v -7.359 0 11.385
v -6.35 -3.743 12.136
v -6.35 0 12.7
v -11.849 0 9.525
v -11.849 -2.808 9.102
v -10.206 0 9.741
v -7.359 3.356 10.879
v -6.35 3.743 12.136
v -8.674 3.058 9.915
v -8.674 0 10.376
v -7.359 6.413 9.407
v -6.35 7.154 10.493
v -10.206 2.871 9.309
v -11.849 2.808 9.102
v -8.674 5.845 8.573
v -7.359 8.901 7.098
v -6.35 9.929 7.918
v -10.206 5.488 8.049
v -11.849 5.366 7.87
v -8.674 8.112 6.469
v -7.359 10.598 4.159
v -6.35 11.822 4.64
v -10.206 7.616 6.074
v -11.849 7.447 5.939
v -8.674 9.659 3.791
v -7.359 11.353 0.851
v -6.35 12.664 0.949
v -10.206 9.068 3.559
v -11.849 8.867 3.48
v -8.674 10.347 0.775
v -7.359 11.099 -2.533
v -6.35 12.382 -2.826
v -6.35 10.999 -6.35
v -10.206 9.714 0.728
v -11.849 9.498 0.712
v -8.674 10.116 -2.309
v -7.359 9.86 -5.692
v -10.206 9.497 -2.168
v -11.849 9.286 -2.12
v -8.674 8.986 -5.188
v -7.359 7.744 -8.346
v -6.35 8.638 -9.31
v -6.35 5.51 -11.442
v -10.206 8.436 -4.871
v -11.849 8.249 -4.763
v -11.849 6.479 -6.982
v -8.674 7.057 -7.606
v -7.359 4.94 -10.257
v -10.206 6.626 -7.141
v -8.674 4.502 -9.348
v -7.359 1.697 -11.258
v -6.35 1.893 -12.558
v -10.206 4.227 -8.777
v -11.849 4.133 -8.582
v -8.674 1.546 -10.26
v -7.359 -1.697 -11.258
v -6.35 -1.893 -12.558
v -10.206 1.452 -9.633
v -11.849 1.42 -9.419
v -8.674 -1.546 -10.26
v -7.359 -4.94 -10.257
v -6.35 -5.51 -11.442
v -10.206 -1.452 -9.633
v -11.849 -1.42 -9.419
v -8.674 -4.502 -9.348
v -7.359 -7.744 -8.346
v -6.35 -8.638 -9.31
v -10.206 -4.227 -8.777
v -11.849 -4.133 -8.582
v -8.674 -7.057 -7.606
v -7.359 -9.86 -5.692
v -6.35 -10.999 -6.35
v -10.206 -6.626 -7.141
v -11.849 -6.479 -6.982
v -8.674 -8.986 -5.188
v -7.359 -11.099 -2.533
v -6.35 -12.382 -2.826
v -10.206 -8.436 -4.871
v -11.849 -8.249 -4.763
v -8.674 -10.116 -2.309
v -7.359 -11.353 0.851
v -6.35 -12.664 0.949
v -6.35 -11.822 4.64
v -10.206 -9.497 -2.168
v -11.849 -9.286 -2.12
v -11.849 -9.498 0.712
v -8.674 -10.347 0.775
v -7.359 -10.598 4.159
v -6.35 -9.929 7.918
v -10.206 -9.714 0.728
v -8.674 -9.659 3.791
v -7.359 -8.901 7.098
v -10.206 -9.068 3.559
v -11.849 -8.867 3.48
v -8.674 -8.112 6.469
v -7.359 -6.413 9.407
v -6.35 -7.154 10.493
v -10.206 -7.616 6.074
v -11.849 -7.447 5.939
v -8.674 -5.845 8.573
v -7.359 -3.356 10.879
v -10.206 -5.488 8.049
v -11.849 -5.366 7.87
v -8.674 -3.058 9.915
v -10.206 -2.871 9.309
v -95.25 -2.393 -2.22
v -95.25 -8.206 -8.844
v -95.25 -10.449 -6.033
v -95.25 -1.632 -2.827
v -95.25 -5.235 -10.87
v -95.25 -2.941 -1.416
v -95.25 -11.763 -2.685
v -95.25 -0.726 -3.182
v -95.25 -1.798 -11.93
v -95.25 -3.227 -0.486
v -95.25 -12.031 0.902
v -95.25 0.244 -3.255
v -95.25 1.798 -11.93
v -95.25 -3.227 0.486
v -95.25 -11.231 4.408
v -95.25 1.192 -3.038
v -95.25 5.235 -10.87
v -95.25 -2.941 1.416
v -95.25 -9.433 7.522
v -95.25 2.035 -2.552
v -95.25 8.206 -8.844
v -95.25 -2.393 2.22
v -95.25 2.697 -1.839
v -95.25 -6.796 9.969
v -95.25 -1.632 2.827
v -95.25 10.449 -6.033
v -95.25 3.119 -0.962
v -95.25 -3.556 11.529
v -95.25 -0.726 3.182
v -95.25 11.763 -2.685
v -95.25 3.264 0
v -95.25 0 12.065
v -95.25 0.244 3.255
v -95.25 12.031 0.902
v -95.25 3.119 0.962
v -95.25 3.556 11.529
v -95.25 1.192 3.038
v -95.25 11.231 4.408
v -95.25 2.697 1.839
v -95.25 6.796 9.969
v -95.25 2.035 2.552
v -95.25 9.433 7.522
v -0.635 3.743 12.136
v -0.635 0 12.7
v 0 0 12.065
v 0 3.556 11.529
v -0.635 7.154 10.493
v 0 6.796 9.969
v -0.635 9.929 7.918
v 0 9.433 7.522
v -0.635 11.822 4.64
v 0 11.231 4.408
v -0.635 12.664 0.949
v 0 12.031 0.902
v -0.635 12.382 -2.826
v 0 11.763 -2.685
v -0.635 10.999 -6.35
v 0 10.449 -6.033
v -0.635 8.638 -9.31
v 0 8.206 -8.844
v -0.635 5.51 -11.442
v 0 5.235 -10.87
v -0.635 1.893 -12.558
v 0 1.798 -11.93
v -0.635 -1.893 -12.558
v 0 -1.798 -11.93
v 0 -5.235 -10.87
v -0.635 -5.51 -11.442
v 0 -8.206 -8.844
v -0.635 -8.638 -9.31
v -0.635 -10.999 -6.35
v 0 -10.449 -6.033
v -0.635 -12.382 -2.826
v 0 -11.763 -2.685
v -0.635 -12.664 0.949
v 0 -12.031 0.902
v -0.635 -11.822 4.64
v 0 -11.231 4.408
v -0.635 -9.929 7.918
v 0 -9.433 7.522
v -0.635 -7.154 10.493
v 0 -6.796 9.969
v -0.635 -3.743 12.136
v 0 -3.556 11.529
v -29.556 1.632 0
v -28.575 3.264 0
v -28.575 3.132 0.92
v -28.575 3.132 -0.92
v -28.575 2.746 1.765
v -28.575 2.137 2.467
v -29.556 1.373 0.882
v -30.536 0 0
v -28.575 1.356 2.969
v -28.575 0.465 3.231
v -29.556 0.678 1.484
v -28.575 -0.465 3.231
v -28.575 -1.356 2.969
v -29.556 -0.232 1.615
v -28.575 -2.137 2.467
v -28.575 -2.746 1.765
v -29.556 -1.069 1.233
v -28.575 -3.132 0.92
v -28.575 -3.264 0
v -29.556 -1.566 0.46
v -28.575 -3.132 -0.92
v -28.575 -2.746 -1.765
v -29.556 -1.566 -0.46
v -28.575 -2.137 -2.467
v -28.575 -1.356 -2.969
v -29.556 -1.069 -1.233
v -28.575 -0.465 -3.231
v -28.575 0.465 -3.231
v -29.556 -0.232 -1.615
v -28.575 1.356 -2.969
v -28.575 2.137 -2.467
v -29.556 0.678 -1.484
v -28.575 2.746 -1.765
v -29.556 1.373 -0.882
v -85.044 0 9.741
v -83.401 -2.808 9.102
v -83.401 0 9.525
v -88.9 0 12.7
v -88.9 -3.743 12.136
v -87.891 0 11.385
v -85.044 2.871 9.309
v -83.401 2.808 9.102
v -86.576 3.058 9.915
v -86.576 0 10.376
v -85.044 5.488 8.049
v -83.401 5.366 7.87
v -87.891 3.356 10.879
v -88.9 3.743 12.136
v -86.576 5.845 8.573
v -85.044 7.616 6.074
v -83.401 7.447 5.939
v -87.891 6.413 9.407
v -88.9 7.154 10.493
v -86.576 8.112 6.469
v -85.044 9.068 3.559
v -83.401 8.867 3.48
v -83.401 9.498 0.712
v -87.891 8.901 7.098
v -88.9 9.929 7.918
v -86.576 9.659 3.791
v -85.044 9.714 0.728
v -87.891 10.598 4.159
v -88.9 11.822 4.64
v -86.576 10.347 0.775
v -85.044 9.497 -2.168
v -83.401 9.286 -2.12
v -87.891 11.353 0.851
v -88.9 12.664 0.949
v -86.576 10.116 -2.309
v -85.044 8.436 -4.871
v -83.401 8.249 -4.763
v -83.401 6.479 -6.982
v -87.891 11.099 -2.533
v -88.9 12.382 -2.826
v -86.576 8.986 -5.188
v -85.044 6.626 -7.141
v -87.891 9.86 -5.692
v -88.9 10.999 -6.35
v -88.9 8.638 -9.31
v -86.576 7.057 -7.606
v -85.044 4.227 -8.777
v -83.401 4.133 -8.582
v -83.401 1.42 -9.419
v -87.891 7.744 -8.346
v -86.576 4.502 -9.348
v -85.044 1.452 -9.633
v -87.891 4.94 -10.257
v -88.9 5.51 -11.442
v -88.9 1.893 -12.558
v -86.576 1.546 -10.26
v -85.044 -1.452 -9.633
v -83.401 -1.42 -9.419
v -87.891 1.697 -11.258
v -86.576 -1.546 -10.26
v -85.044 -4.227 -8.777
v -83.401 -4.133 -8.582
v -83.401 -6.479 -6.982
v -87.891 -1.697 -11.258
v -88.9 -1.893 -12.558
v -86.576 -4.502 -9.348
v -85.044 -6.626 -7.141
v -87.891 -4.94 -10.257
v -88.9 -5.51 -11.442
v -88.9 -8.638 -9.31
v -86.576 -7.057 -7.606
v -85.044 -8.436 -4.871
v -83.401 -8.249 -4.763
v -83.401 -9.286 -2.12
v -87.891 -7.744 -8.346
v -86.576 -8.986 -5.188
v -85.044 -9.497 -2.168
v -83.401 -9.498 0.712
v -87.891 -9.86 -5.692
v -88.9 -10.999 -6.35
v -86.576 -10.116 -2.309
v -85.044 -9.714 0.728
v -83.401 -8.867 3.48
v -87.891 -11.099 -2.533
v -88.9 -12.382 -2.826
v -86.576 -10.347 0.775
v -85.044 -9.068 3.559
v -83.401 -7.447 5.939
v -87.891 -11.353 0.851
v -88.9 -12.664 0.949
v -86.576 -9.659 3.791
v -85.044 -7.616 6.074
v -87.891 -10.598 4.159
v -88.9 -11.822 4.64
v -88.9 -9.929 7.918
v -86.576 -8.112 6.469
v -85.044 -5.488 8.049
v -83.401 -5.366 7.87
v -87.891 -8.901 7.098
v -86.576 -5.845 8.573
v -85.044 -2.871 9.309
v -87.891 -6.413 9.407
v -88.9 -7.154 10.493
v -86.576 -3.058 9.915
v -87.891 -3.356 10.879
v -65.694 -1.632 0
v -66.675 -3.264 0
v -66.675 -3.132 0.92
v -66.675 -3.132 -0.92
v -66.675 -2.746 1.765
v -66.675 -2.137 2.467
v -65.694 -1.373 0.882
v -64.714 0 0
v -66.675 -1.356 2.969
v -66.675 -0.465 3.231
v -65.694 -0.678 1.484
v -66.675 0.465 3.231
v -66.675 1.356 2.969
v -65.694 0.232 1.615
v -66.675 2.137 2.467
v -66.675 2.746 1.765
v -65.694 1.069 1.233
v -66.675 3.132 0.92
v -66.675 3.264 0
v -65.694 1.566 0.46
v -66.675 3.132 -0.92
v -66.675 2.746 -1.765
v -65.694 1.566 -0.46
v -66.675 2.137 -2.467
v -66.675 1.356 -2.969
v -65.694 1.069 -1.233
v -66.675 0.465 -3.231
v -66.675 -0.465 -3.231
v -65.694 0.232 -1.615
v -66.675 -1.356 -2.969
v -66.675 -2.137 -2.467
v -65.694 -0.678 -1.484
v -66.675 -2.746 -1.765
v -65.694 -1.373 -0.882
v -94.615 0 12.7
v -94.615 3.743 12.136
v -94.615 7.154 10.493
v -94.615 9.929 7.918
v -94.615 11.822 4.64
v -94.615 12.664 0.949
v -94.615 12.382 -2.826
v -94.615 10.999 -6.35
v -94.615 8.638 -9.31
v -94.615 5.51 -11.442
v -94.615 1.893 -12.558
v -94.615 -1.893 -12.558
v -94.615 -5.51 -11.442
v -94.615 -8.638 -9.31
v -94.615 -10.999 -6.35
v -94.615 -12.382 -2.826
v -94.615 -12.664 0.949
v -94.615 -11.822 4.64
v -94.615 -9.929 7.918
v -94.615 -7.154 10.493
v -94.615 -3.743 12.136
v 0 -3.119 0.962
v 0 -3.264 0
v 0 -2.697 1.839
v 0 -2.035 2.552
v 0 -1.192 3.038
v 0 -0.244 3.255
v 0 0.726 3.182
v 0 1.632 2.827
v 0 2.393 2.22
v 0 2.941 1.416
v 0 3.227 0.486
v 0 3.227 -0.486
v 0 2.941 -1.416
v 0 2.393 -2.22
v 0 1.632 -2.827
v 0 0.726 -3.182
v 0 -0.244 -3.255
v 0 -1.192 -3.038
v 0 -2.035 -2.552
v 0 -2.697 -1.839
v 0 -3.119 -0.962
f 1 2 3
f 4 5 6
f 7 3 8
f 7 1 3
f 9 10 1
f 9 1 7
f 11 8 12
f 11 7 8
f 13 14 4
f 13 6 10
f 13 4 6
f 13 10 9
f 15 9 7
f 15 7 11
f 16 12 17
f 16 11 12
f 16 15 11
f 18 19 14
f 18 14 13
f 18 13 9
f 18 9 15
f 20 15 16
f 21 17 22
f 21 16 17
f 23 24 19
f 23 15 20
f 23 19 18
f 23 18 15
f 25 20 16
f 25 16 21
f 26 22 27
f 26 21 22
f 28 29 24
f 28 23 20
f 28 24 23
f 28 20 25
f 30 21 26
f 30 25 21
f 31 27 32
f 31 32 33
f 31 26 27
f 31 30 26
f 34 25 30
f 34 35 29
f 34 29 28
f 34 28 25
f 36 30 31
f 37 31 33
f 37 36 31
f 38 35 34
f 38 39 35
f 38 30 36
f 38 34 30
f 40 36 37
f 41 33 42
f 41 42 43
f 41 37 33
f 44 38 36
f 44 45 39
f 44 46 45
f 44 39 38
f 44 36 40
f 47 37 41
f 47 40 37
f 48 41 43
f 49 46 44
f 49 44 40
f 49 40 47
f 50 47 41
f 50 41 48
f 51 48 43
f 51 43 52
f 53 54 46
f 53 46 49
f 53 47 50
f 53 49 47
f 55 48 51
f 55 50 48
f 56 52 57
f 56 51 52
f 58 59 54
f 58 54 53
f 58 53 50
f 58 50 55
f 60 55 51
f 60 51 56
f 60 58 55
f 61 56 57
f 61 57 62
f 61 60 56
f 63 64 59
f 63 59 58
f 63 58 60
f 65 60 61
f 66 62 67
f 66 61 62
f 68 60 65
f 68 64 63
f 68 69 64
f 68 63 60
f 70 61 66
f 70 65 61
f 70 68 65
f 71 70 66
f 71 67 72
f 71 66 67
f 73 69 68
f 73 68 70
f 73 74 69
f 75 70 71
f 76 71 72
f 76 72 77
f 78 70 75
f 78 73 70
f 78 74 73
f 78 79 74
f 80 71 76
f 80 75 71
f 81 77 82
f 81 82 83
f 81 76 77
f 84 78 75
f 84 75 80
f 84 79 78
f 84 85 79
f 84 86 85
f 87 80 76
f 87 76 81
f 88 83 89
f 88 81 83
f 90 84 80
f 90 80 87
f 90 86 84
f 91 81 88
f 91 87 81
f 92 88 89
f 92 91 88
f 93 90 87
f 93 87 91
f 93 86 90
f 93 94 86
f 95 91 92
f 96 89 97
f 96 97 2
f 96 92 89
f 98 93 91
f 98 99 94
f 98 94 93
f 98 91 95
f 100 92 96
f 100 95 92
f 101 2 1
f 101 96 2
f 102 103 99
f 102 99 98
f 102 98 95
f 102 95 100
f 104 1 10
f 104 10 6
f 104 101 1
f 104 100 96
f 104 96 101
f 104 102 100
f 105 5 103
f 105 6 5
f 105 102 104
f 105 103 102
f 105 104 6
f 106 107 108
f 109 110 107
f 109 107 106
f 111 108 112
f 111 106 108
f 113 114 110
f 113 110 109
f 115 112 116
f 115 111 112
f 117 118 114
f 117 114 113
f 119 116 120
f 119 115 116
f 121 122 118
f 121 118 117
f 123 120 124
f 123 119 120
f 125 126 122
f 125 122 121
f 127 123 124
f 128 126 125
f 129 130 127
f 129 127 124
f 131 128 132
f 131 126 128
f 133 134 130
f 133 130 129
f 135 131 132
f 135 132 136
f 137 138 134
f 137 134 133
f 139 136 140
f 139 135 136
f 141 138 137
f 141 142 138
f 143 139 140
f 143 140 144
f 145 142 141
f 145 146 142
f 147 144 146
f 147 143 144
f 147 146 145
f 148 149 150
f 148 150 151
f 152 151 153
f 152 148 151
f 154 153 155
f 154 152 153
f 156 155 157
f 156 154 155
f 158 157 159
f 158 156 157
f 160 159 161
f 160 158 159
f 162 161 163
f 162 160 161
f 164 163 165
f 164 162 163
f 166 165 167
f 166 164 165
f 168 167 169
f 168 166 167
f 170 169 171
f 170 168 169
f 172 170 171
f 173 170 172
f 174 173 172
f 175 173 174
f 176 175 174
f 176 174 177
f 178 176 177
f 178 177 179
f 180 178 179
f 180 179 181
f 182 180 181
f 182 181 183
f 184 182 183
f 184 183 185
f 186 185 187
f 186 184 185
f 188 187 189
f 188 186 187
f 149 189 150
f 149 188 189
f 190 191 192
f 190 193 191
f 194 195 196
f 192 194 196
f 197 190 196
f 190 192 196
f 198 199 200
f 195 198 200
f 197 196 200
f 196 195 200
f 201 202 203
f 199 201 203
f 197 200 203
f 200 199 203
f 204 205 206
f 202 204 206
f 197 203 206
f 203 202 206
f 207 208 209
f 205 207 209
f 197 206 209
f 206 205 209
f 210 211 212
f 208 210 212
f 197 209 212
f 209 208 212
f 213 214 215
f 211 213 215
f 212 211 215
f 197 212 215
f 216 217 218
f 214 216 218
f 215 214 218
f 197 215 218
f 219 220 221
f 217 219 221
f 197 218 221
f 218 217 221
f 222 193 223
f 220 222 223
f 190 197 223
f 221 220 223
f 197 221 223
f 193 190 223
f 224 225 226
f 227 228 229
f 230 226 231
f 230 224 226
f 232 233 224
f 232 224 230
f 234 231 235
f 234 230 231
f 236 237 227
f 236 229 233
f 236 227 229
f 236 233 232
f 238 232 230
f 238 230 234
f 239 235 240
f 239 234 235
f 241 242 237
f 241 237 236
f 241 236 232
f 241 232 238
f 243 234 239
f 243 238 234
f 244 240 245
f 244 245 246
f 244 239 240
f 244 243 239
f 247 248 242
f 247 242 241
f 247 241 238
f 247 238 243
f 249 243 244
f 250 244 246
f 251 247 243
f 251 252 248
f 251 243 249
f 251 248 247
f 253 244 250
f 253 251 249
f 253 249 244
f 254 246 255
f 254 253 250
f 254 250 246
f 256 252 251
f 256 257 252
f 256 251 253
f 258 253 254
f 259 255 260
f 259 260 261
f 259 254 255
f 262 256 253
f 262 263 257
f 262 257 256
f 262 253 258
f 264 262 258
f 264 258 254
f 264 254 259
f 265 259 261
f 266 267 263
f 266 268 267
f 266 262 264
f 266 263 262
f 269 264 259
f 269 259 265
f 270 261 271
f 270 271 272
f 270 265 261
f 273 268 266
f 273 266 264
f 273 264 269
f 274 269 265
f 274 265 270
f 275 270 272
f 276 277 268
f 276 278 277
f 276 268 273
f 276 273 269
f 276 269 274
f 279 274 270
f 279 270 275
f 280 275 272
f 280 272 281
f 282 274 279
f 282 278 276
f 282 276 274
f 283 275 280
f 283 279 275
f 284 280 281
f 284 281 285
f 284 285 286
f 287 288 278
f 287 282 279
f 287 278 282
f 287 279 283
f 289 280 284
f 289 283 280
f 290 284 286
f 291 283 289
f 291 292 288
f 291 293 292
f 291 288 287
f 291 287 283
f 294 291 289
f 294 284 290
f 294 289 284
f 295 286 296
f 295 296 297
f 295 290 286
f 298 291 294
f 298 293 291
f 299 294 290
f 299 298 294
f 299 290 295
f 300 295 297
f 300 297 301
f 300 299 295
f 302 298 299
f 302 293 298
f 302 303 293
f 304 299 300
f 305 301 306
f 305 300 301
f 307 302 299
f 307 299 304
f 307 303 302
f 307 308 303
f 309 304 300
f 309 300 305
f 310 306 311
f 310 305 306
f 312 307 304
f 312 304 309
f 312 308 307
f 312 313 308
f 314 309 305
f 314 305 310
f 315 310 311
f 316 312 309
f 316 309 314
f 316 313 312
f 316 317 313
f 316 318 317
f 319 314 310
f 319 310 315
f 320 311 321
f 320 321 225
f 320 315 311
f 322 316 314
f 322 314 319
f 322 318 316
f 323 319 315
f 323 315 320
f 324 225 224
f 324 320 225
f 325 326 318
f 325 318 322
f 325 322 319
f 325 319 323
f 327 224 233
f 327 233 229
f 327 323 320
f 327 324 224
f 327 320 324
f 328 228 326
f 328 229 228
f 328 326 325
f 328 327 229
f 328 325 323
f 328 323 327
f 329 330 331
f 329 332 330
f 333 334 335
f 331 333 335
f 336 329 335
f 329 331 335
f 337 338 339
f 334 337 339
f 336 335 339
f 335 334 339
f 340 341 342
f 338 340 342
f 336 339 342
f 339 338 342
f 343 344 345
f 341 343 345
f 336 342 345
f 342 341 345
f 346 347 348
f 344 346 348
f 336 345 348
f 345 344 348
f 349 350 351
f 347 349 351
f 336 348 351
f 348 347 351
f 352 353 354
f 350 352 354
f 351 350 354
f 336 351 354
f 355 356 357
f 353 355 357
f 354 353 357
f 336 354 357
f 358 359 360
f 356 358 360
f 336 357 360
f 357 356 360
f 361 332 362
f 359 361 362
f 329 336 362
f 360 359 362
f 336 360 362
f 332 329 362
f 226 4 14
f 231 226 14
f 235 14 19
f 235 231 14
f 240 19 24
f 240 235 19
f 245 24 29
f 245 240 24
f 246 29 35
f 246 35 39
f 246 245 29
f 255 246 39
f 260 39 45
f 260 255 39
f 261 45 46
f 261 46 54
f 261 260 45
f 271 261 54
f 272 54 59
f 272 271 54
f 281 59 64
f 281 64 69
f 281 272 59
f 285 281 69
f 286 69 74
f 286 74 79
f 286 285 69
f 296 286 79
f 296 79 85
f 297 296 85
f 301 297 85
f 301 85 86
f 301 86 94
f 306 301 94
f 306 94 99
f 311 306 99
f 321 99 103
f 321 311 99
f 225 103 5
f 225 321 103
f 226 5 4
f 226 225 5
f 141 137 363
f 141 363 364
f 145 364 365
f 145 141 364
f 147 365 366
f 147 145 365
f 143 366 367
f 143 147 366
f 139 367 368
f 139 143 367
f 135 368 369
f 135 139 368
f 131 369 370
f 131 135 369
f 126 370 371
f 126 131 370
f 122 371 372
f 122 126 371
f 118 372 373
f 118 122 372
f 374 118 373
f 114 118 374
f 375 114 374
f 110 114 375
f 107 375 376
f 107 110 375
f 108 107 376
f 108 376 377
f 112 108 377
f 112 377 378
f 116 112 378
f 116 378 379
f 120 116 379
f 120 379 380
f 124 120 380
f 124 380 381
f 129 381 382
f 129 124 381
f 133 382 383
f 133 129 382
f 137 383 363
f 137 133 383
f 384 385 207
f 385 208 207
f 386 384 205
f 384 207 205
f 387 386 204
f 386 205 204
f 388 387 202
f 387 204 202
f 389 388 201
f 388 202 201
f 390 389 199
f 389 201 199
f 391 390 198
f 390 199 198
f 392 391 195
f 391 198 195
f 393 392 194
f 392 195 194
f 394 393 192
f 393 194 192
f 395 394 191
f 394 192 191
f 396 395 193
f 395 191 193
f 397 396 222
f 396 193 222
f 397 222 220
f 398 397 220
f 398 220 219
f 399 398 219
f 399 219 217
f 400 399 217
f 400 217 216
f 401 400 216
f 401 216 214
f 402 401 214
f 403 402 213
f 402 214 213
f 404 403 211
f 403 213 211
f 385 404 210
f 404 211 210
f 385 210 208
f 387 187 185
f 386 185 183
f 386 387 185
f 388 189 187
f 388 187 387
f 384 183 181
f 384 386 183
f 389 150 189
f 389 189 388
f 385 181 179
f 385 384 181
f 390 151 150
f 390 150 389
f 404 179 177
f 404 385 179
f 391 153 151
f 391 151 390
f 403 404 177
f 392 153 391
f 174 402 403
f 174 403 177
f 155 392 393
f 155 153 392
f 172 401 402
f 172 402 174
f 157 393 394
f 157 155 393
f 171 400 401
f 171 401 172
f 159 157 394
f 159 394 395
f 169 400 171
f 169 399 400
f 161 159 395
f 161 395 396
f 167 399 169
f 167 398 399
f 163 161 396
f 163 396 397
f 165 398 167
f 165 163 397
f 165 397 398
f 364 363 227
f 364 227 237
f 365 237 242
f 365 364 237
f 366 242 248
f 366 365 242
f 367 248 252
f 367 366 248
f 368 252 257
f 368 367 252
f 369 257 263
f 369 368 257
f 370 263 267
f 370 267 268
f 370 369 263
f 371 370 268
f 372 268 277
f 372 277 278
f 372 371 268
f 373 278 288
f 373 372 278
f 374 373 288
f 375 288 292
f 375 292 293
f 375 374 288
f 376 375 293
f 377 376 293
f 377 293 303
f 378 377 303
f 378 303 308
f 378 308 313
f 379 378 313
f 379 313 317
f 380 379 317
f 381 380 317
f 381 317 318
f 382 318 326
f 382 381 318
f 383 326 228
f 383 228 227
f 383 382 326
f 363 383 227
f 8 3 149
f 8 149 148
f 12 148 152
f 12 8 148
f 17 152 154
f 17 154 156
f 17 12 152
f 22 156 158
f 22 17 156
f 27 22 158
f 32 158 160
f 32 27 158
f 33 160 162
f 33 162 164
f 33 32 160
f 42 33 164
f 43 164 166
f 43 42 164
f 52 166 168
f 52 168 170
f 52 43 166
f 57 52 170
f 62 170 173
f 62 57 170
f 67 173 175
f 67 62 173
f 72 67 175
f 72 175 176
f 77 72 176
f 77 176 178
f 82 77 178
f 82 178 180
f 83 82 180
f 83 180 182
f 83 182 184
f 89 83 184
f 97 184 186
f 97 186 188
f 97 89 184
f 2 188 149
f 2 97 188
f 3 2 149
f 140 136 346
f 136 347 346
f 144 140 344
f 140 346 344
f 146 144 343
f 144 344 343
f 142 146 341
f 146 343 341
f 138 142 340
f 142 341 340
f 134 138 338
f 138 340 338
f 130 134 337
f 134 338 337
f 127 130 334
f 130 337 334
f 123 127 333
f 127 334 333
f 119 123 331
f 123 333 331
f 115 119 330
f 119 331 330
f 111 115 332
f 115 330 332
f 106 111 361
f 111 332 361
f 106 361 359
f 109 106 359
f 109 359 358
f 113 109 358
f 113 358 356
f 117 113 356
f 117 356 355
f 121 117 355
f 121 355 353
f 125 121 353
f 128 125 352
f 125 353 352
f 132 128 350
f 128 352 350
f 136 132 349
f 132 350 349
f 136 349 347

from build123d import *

# Parameters (mm, degrees)
F3_D     = 6.5278
F3_DEPTH = 28.575
F3_TIP   = 1.9611489744
F5_D     = 6.5278
F5_DEPTH = 28.575
F5_TIP   = 1.9611489744
F6_SIZE  = 0.635


with BuildPart() as f1:
    # F0 (on Front) → F1 (revolve)
    with BuildSketch(Plane.XZ):
        with BuildLine():
            Line((-95.25, 0), (0, 0))
            Line((0, 0), (0, 12.7))
            Line((0, 12.7), (-6.35, 12.7))
            ThreePointArc((-6.35, 12.7), (-8.674261314, 10.375738686), (-11.849261314, 9.525))
            Line((-11.849261314, 9.525), (-83.400738686, 9.525))
            ThreePointArc((-83.400738686, 9.525), (-86.575738686, 10.375738686), (-88.9, 12.7))
            Line((-88.9, 12.7), (-95.25, 12.7))
            Line((-95.25, 12.7), (-95.25, 0))
        make_face()
    revolve(axis=Axis((-50.5691878498, 0, 0), (-1, 0, 0)))

    # F3
    with Locations(Plane.YZ):
        with Locations((0, 0)):
            Hole(F3_D / 2, depth=F3_DEPTH)
            with Locations((0, 0, -(F3_DEPTH + F3_TIP / 2))):  # 118° drill point
                Cone(0, F3_D / 2, F3_TIP, mode=Mode.SUBTRACT)

    # F5
    with Locations(Plane(origin=(-95.25, 0, 0), x_dir=(0, -1, 0), z_dir=(-1, 0, 0))):
        with Locations((0, 0)):
            Hole(F5_D / 2, depth=F5_DEPTH)
            with Locations((0, 0, -(F5_DEPTH + F5_TIP / 2))):  # 118° drill point
                Cone(0, F5_D / 2, F5_TIP, mode=Mode.SUBTRACT)

    # F6
    f6_edges = [f1.edges().sort_by_distance(p)[0] for p in [
        (0, 0, -12.7),
        (-95.25, 0, -12.7),
    ]]
    chamfer(f6_edges, length=F6_SIZE)


solid = f1.part
